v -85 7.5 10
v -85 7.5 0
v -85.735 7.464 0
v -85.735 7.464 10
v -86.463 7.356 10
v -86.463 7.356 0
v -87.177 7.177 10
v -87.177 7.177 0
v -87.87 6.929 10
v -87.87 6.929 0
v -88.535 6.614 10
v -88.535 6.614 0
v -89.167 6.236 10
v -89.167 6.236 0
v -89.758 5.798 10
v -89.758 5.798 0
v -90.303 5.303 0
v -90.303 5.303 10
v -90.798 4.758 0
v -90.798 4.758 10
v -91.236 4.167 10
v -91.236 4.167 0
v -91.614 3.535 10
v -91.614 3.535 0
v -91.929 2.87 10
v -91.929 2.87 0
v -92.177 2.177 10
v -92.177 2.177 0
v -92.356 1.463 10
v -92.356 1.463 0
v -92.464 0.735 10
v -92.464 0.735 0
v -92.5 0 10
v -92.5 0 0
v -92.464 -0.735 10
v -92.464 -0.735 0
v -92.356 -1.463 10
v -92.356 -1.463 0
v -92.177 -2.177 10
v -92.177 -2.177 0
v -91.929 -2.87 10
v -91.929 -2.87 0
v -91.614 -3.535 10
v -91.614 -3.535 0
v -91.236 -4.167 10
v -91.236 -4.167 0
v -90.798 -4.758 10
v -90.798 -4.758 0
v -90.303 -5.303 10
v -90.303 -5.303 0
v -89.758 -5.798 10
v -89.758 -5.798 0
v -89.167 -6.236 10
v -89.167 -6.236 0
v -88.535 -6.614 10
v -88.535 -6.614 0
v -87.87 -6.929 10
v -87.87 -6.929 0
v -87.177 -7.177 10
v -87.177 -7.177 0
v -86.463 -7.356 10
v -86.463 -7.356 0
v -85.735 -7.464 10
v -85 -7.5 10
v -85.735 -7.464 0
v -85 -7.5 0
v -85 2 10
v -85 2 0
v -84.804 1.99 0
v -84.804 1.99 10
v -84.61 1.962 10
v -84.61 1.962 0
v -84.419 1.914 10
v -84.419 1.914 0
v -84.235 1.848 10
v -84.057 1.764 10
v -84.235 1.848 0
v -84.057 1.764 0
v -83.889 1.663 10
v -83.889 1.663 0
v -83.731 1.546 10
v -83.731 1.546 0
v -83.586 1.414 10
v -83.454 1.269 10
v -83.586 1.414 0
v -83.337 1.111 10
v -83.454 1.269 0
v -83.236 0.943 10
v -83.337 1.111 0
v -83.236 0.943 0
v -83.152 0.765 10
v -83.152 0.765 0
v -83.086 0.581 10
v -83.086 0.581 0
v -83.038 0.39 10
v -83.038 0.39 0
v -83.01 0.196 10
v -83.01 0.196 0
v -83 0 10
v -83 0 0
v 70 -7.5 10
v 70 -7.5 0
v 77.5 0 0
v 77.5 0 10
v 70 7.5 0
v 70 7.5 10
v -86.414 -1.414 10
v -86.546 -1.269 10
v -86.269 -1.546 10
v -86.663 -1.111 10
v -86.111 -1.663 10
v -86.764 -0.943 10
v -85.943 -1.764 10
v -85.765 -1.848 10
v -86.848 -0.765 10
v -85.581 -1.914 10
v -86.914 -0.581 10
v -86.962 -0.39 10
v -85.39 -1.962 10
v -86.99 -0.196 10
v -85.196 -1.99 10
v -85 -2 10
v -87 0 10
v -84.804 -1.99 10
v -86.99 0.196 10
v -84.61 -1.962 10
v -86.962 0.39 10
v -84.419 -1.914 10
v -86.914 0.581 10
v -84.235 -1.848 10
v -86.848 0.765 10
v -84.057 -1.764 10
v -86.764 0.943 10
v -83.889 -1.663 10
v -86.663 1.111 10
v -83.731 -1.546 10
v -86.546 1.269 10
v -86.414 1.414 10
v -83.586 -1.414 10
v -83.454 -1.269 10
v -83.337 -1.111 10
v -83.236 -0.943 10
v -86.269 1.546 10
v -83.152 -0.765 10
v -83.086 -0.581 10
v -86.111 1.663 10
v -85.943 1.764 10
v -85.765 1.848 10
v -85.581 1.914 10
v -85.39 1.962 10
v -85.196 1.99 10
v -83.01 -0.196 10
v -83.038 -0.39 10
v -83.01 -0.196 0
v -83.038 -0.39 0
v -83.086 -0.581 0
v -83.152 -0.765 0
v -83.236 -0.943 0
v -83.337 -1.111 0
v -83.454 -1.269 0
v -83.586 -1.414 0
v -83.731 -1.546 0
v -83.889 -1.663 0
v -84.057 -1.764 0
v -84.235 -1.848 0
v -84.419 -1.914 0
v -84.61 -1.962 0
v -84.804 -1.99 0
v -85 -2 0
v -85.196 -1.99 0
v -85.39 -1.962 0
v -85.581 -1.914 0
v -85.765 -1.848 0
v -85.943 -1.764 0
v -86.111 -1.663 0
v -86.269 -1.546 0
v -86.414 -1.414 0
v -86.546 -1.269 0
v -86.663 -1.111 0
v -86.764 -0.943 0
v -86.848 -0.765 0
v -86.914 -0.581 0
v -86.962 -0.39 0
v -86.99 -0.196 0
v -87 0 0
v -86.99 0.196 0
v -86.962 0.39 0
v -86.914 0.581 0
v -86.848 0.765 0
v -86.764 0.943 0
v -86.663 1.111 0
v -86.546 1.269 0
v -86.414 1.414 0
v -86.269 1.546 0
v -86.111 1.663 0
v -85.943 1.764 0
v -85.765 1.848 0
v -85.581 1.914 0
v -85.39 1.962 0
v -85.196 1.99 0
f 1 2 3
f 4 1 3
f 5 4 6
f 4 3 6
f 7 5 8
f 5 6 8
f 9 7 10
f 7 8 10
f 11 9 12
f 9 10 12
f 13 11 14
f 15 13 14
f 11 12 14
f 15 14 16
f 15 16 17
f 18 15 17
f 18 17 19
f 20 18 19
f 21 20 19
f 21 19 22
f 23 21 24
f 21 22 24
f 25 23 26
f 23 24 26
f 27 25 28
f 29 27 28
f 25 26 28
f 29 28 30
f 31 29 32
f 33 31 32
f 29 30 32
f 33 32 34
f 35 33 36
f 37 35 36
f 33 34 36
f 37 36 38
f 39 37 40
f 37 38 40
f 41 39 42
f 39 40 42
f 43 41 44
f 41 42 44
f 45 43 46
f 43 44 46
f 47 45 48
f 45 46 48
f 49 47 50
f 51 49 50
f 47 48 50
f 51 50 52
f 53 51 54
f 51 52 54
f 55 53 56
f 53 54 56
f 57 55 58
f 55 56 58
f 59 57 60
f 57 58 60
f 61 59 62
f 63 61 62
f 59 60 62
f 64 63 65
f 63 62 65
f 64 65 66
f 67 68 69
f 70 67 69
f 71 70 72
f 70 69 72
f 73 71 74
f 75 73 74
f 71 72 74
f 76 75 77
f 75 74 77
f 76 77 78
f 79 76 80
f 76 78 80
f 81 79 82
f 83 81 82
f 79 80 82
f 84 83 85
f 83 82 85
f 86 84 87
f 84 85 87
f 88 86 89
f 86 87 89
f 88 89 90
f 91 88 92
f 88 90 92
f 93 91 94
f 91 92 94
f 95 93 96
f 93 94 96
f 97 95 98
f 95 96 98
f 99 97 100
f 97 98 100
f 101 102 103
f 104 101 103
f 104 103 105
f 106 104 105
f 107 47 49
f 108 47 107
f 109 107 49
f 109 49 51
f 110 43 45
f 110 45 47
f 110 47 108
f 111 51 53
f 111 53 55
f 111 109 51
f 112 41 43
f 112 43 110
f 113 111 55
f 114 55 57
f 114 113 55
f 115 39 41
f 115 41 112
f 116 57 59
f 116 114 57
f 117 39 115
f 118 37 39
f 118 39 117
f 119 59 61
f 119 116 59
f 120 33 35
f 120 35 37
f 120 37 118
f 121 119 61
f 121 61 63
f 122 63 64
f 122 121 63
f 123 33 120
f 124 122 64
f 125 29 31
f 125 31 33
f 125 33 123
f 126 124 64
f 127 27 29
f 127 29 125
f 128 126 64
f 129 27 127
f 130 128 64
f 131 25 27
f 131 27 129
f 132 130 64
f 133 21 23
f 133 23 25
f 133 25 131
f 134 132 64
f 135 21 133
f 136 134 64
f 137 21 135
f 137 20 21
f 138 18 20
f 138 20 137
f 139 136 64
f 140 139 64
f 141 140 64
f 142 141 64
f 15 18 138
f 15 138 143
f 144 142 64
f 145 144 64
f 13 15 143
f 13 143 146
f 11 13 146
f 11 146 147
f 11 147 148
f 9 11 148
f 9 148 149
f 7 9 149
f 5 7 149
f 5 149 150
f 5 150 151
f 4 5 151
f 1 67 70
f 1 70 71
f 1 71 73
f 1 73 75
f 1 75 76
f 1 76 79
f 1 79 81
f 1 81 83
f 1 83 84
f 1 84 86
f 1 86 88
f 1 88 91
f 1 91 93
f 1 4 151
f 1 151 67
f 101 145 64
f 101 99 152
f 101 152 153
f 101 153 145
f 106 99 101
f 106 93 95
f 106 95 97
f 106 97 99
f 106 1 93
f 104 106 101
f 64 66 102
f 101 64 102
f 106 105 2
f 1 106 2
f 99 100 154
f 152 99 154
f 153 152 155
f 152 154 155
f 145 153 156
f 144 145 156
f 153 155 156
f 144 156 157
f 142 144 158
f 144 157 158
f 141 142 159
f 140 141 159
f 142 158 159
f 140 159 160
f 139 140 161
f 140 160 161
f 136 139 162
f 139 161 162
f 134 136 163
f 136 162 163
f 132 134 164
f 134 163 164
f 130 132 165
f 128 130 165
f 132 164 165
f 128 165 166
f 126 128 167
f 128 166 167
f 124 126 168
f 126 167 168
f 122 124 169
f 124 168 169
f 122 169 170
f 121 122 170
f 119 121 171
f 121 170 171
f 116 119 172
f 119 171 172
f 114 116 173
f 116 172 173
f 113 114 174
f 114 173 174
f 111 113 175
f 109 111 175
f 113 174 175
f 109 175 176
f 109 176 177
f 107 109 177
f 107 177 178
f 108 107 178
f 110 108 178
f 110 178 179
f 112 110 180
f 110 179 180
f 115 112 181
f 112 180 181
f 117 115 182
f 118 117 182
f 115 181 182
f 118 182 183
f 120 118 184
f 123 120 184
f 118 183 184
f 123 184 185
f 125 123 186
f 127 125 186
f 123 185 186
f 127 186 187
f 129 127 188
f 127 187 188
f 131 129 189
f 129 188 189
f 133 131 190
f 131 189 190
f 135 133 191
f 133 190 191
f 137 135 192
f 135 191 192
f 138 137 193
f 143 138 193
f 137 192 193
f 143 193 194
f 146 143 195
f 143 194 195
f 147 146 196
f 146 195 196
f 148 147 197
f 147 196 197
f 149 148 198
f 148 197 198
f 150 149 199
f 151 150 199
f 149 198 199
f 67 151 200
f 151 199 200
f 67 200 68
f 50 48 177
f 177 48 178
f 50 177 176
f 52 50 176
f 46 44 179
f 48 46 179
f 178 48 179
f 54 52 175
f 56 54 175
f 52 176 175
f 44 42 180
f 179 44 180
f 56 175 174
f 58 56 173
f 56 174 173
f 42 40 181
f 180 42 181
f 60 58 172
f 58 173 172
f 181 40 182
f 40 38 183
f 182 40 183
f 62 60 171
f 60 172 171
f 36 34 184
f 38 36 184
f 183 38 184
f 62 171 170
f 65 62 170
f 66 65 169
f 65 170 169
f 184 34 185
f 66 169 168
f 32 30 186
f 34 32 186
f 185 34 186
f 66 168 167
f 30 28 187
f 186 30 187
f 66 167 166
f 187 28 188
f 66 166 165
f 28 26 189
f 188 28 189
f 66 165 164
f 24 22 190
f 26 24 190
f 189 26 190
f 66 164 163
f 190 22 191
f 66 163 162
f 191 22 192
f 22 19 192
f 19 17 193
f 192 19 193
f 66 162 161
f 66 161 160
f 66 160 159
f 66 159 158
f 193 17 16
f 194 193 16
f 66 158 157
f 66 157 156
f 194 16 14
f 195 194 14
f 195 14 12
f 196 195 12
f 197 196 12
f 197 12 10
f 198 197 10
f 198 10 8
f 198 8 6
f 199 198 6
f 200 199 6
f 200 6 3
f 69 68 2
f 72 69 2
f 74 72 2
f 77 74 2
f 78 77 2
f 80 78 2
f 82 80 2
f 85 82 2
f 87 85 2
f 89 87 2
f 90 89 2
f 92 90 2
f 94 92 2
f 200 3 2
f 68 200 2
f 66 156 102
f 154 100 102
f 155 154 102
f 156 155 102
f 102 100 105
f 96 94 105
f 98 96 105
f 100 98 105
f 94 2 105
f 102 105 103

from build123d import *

# Parameters (mm, degrees)
F1_DEPTH = 10


with BuildPart() as f1:
    # F0 (on Top) → F1 (new body)
    with BuildSketch(Plane.XY):
        with BuildLine():
            Line((70, 7.5), (-85, 7.5))
            Line((-85, 7.5), (-85, 2))
            ThreePointArc((-85, 2), (-83.585786, 1.414214), (-83, 0))
            ThreePointArc((-83, 0), (-83.585786, -1.414214), (-85, -2))
            Line((-85, -2), (-85, -7.5))
            Line((-85, -7.5), (70, -7.5))
            Line((70, -7.5), (77.5, 0))
            Line((77.5, 0), (70, 7.5))
        make_face()
        with BuildLine():
            Line((-85, 2), (-85, 7.5))
            ThreePointArc((-85, 7.5), (-92.5, 0), (-85, -7.5))
            Line((-85, -7.5), (-85, -2))
            ThreePointArc((-85, -2), (-87, 0), (-85, 2))
        make_face()
    extrude(amount=F1_DEPTH)


solid = f1.part
